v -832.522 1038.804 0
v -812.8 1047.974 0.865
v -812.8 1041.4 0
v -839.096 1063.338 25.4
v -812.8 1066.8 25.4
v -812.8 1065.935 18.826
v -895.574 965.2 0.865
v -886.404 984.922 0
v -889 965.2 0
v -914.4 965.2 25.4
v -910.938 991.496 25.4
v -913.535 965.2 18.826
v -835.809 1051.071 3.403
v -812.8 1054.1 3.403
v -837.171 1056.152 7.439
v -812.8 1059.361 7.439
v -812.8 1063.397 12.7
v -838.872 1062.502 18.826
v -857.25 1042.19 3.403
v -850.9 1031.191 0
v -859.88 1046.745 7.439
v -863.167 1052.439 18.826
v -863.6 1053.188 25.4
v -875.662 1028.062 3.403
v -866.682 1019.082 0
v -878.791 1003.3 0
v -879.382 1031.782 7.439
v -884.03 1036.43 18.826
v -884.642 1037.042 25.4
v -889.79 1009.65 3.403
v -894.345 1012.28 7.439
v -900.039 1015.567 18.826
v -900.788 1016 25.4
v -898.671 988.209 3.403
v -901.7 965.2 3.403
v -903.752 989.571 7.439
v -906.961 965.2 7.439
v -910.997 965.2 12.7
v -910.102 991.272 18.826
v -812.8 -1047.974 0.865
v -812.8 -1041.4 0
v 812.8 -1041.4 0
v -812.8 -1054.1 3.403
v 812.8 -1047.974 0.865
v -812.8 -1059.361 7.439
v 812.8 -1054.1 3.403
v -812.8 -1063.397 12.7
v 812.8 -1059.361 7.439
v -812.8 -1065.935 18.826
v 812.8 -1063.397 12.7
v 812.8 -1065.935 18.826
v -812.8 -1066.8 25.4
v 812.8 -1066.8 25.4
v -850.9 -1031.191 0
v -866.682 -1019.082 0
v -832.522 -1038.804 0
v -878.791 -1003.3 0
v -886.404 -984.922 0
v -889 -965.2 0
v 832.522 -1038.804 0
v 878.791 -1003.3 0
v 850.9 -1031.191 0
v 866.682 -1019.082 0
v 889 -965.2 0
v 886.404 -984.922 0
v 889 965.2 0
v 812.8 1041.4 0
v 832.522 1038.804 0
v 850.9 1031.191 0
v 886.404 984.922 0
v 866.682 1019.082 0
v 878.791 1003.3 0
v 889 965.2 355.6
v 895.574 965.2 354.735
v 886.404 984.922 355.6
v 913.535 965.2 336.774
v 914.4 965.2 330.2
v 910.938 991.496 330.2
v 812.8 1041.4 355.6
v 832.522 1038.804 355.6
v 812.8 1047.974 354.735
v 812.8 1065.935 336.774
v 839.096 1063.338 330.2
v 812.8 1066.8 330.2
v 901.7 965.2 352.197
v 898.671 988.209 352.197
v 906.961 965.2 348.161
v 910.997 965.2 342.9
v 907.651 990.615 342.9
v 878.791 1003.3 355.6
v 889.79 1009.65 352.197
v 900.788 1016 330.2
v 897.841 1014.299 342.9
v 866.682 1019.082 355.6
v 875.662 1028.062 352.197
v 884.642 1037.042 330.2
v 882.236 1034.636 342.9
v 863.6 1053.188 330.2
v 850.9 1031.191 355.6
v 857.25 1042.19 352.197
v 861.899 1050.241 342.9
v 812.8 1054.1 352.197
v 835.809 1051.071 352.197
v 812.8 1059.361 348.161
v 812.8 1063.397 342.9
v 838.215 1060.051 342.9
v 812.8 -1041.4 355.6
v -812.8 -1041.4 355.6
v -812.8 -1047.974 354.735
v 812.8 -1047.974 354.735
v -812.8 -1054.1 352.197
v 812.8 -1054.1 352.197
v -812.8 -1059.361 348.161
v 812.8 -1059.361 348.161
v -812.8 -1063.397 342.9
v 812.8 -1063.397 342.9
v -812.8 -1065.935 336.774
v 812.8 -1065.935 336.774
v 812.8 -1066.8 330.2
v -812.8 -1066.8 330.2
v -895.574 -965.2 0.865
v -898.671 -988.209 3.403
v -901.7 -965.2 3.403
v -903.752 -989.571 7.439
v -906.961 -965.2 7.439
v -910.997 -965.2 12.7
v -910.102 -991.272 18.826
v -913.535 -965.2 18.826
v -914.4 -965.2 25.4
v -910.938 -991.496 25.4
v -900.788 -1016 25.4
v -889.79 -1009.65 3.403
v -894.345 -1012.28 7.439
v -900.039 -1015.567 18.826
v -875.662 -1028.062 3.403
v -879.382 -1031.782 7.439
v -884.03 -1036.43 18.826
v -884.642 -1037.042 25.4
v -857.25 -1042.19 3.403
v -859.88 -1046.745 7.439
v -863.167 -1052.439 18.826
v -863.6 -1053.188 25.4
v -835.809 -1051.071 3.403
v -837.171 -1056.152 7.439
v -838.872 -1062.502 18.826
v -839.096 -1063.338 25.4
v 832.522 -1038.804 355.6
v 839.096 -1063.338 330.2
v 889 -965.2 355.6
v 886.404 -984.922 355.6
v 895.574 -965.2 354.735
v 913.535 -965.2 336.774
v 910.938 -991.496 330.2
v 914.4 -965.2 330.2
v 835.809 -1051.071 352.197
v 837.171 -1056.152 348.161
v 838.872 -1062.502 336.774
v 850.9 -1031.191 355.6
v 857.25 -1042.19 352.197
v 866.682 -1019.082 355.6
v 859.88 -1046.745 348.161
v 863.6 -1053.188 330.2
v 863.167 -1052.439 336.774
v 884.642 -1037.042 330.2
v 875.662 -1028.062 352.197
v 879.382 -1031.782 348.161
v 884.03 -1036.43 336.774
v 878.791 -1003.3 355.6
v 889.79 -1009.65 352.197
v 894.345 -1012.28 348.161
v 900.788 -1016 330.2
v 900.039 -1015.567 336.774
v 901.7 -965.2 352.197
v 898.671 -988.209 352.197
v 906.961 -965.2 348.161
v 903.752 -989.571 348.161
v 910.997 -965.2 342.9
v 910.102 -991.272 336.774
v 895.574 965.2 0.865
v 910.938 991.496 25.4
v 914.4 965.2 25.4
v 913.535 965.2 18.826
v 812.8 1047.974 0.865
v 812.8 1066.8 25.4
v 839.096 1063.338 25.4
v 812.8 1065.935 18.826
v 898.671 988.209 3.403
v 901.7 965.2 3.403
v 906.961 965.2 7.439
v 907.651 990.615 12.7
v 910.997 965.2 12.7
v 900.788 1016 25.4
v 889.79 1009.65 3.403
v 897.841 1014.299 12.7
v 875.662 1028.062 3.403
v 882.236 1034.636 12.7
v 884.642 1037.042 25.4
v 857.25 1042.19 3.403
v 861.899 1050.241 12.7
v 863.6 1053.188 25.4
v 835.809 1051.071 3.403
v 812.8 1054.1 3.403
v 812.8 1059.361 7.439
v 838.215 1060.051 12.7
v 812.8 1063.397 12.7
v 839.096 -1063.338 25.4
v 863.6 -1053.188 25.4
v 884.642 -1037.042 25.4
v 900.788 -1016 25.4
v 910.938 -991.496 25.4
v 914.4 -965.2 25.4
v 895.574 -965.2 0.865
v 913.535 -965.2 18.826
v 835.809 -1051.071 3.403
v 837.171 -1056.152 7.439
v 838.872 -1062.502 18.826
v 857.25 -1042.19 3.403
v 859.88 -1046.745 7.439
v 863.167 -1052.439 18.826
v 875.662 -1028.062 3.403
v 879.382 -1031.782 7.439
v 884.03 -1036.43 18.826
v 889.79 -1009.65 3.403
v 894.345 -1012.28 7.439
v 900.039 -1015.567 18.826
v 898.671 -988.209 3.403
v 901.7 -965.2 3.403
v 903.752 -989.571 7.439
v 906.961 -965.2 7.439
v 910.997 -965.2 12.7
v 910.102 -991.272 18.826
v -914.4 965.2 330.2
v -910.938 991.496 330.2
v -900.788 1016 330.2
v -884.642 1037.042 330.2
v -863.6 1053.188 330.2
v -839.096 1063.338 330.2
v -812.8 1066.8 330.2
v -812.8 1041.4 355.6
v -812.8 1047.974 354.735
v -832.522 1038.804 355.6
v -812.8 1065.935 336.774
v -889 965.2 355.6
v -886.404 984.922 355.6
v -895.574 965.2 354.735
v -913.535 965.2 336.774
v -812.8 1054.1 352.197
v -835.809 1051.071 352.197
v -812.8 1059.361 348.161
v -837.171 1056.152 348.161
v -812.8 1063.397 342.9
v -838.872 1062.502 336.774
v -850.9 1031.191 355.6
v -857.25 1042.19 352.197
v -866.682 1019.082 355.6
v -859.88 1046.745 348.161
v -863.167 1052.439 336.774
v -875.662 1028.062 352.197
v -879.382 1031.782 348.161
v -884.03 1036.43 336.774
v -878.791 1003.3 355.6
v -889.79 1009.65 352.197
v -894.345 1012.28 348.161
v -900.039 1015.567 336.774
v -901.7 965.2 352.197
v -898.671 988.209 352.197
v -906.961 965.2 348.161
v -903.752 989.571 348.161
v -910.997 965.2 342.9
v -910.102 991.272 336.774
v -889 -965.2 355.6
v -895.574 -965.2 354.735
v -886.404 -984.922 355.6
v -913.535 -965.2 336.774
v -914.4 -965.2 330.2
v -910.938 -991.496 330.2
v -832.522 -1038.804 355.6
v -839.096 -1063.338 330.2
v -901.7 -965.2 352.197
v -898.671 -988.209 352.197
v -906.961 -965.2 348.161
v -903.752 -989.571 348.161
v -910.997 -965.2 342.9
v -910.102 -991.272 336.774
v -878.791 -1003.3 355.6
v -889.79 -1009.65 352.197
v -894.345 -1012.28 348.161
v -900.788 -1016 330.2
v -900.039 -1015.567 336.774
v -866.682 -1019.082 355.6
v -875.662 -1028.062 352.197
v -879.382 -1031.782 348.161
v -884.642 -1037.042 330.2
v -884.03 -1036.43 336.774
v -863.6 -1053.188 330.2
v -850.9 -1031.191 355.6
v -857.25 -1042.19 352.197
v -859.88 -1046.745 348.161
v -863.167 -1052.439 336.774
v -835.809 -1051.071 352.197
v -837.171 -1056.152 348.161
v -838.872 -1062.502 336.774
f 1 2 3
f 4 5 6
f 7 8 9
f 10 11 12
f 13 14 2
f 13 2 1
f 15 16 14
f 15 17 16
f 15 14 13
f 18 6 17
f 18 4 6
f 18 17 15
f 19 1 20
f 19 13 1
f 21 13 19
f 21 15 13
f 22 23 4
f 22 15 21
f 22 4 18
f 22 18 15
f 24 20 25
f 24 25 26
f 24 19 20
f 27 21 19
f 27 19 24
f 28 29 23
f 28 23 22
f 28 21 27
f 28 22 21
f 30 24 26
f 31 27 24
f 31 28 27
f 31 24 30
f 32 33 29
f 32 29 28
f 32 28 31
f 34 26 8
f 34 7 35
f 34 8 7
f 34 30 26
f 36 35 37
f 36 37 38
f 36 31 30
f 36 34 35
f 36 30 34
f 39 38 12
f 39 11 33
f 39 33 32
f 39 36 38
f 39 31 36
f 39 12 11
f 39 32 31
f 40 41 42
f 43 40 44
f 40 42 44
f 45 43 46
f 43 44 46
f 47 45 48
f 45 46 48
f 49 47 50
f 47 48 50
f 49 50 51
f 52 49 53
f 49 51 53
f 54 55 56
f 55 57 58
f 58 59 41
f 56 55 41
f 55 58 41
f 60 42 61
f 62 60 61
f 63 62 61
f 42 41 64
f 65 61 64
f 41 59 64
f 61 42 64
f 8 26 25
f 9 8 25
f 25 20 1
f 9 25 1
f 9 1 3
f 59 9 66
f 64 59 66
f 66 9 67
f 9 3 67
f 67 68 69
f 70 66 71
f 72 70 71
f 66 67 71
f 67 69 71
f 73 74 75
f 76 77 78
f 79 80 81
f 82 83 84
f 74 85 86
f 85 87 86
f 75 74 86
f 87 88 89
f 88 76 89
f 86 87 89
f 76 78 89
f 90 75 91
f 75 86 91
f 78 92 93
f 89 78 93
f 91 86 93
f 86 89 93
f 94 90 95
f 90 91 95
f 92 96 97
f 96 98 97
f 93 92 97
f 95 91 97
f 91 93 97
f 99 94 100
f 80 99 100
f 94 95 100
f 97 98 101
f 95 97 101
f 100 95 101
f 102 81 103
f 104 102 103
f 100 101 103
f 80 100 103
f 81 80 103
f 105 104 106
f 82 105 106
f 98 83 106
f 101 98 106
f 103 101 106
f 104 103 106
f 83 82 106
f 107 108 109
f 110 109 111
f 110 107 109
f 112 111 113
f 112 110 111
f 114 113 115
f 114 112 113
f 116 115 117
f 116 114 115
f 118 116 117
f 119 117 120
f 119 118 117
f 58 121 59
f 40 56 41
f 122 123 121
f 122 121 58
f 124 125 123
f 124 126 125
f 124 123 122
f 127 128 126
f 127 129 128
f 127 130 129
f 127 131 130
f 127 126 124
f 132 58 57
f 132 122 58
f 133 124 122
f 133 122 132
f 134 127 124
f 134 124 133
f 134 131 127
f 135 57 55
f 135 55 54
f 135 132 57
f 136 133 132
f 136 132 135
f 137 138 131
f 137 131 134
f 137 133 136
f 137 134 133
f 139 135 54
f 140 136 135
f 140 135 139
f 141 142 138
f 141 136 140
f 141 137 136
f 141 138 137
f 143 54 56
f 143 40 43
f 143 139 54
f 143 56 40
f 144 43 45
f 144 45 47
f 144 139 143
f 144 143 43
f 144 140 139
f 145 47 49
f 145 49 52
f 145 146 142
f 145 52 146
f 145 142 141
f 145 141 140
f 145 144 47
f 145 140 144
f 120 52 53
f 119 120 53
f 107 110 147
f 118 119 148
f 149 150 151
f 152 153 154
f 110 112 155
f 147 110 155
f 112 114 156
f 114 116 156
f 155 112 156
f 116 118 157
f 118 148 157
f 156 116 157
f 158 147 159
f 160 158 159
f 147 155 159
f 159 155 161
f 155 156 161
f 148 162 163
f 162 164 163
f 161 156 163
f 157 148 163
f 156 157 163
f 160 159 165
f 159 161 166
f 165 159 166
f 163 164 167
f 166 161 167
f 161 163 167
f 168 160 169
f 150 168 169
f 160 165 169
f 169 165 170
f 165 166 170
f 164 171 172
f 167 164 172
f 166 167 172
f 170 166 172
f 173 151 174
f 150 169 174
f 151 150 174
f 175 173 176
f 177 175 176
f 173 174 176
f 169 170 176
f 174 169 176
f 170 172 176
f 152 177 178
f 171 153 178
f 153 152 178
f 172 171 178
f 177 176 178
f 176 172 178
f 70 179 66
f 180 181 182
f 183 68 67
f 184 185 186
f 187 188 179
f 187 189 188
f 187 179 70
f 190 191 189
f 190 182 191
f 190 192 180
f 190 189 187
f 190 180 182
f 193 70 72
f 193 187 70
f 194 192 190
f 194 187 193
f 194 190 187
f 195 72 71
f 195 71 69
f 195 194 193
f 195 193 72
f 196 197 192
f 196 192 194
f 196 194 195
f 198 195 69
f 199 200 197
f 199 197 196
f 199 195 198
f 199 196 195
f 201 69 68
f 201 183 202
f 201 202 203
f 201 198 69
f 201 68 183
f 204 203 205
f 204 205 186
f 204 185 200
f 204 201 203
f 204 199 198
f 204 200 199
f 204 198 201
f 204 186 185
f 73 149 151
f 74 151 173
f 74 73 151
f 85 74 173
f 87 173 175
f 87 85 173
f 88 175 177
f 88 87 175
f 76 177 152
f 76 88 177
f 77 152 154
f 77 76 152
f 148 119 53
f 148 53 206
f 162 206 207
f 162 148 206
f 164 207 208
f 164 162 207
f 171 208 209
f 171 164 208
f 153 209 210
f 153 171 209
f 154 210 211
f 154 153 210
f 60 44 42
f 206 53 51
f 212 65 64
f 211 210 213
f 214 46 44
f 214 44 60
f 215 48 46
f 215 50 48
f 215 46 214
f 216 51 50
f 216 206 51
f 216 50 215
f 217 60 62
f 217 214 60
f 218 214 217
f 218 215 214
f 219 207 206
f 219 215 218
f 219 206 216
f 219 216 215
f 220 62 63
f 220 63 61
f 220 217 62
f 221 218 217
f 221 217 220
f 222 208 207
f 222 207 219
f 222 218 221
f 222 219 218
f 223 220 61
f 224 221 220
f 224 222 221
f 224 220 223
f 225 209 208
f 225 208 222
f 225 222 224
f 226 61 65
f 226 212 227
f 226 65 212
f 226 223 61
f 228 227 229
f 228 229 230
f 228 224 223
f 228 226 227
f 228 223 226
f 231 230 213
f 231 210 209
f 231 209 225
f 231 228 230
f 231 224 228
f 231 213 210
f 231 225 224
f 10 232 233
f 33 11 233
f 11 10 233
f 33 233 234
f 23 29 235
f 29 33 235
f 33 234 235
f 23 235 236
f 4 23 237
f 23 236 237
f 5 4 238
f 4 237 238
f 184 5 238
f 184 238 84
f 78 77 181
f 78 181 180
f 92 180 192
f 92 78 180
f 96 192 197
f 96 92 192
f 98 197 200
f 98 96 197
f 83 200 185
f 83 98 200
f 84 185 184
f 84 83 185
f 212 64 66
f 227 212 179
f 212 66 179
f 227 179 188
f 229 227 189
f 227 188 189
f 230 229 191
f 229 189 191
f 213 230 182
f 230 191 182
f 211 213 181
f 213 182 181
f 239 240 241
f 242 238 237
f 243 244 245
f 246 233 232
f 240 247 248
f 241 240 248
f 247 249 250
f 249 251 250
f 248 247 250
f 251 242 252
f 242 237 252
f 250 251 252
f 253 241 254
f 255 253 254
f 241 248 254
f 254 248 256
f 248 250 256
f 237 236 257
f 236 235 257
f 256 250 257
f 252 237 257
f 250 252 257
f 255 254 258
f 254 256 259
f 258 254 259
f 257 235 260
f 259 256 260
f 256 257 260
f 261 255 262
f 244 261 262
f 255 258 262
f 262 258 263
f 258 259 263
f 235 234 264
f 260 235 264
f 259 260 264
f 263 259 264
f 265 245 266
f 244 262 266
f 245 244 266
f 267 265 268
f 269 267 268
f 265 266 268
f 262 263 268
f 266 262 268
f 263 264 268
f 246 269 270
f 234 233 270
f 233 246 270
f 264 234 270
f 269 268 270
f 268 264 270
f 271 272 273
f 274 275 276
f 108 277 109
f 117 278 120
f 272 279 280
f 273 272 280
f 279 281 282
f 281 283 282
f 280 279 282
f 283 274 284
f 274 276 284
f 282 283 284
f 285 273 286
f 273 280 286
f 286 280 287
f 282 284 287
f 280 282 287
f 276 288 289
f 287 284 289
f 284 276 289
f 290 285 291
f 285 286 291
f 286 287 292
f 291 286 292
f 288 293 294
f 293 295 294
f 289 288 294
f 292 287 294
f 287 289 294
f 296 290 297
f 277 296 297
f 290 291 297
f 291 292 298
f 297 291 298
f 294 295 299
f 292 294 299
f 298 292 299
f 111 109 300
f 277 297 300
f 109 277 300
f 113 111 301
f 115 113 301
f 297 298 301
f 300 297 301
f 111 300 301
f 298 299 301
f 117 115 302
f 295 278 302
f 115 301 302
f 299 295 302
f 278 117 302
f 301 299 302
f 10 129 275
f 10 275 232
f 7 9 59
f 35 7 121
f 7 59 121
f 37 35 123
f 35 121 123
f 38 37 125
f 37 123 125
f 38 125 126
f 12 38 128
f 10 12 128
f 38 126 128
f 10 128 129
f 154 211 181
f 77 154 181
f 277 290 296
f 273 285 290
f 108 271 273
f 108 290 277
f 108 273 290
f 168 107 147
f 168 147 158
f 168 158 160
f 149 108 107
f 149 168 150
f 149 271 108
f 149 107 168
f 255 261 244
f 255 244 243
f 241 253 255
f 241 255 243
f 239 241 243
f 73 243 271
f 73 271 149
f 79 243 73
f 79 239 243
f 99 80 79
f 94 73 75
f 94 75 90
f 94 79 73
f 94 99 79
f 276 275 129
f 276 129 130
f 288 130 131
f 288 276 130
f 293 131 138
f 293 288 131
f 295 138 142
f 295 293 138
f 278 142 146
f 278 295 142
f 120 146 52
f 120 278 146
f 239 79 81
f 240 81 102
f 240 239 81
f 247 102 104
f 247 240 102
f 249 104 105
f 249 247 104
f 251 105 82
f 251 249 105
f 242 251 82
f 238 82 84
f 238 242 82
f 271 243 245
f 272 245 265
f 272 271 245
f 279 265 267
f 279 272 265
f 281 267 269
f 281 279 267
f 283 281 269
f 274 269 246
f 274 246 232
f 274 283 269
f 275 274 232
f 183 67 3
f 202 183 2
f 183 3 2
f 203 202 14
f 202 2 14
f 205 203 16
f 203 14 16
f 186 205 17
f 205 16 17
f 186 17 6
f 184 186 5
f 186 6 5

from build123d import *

# Parameters (mm, degrees)
F0_W     = 1828.8
F0_H     = 2133.6
F1_DEPTH = 355.6
F2_R     = 101.6
F3_R     = 25.4


with BuildPart() as f1:
    # F0 (on Top) → F1 (new body)
    with BuildSketch(Plane.XY):
        Rectangle(F0_W, F0_H)
    extrude(amount=F1_DEPTH)

    # F2
    f2_edges = [f1.edges().sort_by_distance(p)[0] for p in [
        (-914.4, -1066.8, 177.8),
        (914.4, -1066.8, 177.8),
        (914.4, 1066.8, 177.8),
        (-914.4, 1066.8, 177.8),
    ]]
    fillet(f2_edges, radius=F2_R)

    # F3
    f3_edges = [f1.edges().sort_by_distance(p)[0] for p in [
        (884.642049, 1037.042049, 355.6),
        (884.642049, 1037.042049, 0),
    ]]
    fillet(f3_edges, radius=F3_R)


solid = f1.part
